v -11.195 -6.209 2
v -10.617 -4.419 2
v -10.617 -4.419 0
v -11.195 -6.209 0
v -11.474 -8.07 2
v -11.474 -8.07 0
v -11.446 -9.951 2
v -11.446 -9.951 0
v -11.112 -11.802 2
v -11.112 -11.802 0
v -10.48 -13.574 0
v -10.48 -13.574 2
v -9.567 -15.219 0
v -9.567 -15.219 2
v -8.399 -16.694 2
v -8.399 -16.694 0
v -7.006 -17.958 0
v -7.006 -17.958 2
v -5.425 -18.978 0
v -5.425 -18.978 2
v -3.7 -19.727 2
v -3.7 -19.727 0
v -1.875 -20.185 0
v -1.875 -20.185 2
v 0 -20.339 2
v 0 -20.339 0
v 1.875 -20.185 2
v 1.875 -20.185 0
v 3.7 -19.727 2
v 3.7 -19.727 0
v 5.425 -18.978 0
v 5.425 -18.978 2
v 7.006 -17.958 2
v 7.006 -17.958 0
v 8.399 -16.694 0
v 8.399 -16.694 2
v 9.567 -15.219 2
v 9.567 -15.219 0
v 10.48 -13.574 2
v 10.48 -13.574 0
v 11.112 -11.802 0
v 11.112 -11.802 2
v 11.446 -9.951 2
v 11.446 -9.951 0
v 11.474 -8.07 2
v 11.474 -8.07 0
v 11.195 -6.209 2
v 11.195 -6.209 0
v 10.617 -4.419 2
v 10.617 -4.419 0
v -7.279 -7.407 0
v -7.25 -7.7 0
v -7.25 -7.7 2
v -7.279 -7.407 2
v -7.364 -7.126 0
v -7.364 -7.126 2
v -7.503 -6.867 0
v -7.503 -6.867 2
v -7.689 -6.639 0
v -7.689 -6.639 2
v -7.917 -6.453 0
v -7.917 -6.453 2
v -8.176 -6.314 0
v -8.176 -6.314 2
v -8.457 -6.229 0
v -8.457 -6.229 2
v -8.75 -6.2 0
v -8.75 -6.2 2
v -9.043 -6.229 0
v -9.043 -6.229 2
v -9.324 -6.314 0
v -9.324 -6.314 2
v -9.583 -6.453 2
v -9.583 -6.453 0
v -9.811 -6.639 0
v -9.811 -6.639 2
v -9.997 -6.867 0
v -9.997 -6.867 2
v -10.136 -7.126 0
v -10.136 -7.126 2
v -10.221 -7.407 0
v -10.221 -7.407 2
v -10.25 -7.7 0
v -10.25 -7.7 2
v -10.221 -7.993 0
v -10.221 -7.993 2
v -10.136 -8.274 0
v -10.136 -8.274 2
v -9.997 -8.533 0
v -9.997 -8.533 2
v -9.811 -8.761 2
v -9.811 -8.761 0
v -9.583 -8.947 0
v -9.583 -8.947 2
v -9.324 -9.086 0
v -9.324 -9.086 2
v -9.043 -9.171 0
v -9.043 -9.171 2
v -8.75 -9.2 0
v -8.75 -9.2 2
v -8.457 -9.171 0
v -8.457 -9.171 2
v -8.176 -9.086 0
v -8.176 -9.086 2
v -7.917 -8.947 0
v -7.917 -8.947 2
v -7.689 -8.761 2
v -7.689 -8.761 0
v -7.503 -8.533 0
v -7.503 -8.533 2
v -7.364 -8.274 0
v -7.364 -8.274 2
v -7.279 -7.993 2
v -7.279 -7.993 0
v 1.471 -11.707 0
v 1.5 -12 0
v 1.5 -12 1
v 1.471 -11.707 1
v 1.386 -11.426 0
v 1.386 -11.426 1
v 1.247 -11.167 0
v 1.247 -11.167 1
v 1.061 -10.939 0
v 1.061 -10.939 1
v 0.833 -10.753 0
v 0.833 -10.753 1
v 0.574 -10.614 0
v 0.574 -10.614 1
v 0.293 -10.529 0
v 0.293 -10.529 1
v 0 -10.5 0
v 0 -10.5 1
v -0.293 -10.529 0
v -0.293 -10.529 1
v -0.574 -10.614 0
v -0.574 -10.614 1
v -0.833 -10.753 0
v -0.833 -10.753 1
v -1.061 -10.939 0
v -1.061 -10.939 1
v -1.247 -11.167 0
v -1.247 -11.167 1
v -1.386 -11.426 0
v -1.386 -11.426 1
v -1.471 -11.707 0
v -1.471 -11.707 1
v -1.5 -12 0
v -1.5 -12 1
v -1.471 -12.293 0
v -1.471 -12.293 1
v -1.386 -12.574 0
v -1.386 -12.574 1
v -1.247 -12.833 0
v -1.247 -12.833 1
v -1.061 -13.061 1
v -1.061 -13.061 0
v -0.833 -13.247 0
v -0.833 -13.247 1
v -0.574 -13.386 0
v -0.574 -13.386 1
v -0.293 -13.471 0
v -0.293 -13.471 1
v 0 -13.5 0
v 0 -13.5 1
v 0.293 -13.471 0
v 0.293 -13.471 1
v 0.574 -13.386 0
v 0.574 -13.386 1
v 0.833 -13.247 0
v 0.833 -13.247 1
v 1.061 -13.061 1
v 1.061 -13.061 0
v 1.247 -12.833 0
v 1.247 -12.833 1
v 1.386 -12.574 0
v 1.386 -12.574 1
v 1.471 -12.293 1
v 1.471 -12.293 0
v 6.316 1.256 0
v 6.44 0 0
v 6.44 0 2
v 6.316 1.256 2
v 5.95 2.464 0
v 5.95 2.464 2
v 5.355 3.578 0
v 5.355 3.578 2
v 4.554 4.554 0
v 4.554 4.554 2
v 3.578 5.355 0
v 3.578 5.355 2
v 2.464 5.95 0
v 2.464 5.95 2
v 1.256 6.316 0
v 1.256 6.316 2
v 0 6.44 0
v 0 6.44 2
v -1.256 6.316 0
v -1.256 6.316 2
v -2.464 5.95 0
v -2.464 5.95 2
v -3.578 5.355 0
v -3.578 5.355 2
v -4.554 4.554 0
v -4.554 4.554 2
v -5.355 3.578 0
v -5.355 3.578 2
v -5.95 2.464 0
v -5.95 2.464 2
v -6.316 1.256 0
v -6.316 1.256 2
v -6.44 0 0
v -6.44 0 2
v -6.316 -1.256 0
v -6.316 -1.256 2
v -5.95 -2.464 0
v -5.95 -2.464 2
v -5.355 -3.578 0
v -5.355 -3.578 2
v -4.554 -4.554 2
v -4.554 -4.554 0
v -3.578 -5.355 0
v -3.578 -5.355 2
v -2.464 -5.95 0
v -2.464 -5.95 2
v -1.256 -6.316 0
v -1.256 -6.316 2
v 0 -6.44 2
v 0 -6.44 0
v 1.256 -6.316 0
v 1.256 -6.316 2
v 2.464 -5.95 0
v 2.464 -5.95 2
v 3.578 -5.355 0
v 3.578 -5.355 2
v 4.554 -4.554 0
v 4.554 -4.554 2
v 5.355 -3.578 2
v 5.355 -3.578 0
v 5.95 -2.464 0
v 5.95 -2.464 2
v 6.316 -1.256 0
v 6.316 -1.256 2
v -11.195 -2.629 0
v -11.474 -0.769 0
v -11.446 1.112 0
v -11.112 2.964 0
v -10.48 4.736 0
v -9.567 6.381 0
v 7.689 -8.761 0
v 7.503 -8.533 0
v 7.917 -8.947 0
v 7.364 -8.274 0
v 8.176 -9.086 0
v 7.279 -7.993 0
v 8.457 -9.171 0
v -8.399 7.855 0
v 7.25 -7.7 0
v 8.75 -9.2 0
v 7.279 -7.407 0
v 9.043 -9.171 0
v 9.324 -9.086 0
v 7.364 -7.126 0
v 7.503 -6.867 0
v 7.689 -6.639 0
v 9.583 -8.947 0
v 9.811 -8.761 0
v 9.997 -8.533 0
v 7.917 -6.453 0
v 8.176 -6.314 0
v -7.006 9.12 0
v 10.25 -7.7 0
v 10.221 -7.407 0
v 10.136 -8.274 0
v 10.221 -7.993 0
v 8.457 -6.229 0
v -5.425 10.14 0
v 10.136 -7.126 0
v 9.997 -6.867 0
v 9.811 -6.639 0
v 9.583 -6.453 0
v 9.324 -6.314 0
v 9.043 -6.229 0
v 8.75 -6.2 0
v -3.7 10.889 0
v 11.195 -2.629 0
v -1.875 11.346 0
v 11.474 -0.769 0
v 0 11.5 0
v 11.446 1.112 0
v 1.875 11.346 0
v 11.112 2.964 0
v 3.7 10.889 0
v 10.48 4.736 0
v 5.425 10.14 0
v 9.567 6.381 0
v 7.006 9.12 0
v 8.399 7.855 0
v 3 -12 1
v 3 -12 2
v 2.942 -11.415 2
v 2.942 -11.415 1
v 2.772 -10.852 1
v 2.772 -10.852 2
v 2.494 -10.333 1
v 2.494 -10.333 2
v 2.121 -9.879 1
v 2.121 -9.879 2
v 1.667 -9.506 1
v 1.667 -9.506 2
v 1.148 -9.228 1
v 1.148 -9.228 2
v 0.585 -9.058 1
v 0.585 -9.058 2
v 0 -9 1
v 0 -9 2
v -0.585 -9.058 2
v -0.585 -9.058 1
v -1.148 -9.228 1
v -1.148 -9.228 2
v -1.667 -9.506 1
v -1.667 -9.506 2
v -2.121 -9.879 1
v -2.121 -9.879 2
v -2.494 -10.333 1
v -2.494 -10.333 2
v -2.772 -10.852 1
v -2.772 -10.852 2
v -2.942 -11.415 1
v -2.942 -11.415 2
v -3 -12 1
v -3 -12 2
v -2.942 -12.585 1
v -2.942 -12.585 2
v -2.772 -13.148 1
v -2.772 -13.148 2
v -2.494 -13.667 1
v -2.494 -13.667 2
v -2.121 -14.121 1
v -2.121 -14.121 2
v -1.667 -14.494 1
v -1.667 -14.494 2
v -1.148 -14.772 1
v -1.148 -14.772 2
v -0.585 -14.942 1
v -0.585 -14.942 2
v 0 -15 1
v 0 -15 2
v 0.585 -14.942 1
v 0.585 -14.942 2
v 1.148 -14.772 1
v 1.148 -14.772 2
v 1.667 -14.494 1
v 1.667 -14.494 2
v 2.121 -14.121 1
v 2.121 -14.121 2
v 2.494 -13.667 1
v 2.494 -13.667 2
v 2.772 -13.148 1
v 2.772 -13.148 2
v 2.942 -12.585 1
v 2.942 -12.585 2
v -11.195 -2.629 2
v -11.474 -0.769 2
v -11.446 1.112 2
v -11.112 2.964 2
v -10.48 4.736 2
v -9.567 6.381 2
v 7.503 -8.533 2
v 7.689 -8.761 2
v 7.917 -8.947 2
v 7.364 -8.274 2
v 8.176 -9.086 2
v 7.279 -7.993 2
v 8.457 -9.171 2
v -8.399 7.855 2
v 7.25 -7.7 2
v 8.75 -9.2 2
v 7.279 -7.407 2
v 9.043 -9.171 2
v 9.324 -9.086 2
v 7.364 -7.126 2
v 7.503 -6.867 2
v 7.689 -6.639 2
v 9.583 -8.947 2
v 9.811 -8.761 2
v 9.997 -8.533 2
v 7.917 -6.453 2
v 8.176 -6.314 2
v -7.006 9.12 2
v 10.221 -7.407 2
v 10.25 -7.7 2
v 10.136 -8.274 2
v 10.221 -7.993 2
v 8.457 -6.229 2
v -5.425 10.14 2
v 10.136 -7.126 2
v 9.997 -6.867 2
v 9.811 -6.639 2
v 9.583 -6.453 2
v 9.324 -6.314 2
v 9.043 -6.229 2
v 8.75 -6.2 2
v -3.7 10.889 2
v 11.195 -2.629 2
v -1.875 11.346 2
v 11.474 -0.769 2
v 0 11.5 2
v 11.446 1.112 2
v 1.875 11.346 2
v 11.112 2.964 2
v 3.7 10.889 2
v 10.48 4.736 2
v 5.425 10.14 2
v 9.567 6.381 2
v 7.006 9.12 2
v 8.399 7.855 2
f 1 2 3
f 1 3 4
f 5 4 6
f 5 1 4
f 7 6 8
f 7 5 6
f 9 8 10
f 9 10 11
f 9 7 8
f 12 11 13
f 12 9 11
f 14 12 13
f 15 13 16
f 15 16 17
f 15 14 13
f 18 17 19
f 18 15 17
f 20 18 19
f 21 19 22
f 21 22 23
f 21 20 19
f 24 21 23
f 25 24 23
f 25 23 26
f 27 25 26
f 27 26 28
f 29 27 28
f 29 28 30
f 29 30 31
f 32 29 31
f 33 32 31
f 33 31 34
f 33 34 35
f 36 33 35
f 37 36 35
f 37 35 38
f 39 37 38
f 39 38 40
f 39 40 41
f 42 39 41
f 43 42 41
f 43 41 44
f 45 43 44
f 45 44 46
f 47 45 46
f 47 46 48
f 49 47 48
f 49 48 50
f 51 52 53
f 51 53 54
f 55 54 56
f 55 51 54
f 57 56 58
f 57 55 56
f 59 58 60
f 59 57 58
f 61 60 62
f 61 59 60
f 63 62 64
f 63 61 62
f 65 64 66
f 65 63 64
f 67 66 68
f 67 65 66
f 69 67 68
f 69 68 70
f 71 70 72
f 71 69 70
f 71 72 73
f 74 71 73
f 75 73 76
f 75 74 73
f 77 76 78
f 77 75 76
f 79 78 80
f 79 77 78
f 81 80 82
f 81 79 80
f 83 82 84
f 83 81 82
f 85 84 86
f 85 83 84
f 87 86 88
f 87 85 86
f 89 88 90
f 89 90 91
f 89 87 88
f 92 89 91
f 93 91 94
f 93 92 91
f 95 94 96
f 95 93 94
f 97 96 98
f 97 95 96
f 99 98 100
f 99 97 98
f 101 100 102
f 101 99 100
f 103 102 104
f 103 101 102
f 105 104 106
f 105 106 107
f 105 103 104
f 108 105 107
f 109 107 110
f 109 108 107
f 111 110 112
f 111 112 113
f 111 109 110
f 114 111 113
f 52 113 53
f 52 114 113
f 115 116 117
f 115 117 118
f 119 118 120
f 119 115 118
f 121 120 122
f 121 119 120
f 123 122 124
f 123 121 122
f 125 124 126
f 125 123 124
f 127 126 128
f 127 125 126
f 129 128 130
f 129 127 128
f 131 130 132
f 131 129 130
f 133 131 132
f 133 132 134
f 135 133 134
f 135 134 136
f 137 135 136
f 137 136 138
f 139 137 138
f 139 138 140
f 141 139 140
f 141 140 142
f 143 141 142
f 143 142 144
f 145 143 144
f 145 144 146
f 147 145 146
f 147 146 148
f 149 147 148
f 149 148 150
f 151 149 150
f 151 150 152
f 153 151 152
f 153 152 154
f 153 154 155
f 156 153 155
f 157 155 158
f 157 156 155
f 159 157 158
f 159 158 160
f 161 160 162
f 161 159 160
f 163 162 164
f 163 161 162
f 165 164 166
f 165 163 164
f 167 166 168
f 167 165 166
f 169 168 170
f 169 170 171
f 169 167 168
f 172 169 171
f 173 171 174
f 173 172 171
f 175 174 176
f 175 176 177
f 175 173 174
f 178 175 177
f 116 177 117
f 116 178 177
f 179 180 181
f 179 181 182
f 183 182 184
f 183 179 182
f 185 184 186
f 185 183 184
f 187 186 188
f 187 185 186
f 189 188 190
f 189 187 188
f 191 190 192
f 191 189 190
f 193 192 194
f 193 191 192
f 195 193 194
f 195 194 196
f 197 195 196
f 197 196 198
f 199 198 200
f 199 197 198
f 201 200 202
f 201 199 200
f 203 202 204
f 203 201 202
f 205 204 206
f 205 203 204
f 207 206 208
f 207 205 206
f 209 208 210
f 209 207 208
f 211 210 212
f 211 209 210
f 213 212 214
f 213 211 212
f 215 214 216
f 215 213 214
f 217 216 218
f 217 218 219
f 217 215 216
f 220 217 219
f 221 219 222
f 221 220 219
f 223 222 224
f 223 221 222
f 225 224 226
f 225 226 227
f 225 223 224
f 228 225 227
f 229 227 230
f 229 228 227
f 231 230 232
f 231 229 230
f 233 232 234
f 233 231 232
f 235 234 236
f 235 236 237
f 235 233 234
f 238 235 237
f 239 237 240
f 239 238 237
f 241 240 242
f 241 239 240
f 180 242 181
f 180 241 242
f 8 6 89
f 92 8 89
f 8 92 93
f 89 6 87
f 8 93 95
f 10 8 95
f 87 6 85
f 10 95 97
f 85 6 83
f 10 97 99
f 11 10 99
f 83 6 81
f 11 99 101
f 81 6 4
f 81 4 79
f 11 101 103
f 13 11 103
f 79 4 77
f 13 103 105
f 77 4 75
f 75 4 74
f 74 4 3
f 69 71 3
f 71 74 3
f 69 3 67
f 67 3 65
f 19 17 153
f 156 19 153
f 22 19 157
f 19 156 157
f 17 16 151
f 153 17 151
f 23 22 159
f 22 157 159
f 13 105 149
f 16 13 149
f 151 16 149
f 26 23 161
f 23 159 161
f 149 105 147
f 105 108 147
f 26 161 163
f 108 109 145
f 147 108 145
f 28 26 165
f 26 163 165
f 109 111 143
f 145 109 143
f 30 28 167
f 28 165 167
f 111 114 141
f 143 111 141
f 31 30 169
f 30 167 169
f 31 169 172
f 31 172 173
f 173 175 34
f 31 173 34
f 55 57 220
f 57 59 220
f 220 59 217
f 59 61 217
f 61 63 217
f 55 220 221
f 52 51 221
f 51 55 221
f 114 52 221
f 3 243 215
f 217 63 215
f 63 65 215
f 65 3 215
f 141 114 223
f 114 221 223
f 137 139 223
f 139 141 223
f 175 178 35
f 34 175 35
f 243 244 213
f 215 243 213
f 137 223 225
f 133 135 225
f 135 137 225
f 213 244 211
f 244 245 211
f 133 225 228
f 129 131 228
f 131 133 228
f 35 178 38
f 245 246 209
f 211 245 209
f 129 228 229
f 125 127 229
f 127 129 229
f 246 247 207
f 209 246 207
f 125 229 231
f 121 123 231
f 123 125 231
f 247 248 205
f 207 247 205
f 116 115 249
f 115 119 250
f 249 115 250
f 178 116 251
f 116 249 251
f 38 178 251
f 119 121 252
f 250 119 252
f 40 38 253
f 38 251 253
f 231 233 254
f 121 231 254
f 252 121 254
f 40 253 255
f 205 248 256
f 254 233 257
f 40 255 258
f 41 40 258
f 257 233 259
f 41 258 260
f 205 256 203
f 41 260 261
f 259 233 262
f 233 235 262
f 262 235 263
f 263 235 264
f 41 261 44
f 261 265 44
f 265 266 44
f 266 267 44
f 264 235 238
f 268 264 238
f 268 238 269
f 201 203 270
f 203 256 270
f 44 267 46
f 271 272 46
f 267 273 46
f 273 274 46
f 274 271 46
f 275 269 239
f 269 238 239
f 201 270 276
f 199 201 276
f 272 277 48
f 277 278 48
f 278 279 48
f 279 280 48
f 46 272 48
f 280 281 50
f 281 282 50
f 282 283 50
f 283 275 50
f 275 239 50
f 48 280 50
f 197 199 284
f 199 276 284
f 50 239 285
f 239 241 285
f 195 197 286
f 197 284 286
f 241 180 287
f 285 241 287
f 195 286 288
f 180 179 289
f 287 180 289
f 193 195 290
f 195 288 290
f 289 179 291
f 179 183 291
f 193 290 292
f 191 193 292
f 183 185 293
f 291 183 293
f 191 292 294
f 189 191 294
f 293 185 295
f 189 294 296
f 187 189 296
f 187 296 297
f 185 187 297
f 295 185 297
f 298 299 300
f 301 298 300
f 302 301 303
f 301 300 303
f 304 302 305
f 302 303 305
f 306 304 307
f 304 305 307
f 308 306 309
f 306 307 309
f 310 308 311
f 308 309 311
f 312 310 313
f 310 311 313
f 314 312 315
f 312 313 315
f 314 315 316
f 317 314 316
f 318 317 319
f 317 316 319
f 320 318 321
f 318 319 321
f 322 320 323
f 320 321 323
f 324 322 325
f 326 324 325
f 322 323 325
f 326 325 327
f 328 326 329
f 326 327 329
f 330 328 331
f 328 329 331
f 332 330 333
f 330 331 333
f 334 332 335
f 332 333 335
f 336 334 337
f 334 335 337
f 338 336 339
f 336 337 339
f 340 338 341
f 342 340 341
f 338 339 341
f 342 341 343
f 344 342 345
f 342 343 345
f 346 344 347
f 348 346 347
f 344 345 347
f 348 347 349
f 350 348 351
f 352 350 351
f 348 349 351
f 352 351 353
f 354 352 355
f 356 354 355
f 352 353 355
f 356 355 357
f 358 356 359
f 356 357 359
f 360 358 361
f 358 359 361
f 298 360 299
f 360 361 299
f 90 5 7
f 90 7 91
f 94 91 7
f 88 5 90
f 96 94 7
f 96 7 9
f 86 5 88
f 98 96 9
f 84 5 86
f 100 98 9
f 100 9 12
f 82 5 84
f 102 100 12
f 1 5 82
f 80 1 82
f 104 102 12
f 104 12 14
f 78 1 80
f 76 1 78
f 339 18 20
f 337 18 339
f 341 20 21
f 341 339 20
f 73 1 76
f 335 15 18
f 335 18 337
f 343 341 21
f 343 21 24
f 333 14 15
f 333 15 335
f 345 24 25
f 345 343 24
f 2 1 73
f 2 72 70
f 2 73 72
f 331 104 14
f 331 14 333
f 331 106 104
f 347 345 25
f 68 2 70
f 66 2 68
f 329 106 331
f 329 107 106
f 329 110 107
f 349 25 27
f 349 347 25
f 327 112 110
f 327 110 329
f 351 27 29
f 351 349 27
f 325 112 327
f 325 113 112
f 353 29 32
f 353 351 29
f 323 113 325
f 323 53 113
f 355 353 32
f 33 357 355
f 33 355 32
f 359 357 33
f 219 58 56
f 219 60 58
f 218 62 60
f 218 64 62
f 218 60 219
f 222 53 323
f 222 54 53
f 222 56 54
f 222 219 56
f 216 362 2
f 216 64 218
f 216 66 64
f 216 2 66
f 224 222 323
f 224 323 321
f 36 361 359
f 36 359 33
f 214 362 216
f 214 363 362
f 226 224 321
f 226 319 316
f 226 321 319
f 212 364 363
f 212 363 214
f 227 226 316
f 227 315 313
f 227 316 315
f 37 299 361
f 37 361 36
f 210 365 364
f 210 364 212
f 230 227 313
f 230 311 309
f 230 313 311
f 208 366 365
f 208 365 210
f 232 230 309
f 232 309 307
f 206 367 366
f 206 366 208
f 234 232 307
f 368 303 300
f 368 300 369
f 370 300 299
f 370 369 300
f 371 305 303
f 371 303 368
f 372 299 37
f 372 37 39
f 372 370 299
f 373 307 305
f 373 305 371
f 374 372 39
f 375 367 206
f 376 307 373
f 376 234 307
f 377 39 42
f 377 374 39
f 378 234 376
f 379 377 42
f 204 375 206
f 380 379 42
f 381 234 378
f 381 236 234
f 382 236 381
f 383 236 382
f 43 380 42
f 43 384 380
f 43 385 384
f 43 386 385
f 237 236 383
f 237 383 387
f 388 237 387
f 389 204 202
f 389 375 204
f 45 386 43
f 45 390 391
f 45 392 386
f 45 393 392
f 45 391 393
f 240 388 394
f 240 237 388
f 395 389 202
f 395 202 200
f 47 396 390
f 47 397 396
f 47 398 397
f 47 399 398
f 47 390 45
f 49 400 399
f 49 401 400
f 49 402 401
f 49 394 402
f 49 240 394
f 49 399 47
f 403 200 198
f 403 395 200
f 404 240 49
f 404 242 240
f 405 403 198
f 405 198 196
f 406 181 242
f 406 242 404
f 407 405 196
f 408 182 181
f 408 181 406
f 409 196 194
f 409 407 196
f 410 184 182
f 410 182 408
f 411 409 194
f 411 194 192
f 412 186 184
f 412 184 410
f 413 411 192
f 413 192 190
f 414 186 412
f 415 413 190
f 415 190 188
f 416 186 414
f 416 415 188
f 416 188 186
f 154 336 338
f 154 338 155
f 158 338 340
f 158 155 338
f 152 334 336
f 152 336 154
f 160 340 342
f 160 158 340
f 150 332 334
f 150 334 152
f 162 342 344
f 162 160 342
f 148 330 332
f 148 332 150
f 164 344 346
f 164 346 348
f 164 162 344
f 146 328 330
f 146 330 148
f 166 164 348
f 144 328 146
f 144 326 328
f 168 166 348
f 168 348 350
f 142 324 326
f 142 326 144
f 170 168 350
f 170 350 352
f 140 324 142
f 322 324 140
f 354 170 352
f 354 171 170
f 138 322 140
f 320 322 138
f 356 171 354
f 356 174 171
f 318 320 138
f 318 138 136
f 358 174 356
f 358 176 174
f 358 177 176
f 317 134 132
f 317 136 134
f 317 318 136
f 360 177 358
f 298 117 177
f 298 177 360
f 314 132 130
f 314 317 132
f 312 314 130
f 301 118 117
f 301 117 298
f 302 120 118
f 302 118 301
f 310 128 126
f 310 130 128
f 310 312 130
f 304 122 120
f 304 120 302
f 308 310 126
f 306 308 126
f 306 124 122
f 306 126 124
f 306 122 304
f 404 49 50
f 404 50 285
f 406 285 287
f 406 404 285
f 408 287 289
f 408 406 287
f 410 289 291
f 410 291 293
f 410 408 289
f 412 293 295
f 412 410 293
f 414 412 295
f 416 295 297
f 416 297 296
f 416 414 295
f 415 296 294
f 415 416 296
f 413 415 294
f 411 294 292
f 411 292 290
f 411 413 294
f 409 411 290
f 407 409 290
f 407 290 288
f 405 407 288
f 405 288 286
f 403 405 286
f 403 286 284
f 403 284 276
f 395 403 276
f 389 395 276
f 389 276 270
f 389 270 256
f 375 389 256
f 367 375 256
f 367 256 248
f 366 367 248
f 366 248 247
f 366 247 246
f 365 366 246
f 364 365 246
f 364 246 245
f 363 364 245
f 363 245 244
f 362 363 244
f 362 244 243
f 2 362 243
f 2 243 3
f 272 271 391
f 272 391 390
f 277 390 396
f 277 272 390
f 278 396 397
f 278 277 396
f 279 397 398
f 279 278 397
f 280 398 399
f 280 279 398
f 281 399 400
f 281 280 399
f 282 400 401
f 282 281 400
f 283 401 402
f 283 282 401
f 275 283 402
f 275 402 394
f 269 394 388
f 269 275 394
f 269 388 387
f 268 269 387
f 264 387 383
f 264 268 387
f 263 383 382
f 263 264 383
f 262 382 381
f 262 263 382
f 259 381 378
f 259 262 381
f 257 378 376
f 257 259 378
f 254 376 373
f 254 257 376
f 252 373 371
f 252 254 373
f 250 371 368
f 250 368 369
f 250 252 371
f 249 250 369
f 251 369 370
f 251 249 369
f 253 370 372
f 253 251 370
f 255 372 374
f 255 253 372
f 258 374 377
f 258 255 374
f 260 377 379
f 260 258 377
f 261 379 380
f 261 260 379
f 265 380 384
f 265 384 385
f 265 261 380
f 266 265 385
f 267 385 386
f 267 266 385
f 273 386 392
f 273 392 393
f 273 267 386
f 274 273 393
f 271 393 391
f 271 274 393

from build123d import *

# Parameters (mm, degrees)
SKETCH_1_W          = 24
SKETCH_1_H          = 33.932299882
SKETCH_1_R          = 1.5
SKETCH_1_R_2        = 6.44
SKETCH_1_R_3        = 3
EXTRUDE_1_DEPTH     = 2
CUT_EXTRUDE_START   = 2
SKETCH_1_3_R        = 3
SKETCH_1_3_R_2      = 1.5
CUT_EXTRUDE_1_DEPTH = 1
SKETCH_2_W          = 24
SKETCH_2_H          = 33.932299882
CUT_EXTRUDE_3_DEPTH = 3


with BuildPart() as part:
    # 草图1 → 凸台-拉伸1 (new body)
    with BuildSketch(Plane.XY):
        with Locations((0, -4.966149941)):
            Rectangle(SKETCH_1_W, SKETCH_1_H)
        with Locations((-8.75, -7.7)):
            Circle(SKETCH_1_R, mode=Mode.SUBTRACT)
        Circle(SKETCH_1_R_2, mode=Mode.SUBTRACT)
        with Locations((0, -12)):
            Circle(SKETCH_1_R_3, mode=Mode.SUBTRACT)
        with Locations((8.75, -7.7)):
            Circle(SKETCH_1_R, mode=Mode.SUBTRACT)
        with Locations((0, -12)):
            Circle(SKETCH_1_R_3)
        with Locations((0, -12)):
            Circle(SKETCH_1_R, mode=Mode.SUBTRACT)
    extrude(amount=EXTRUDE_1_DEPTH)

    # 草图1<3> → 切除-拉伸1 (cut)
    with BuildSketch(Plane.XY.offset(CUT_EXTRUDE_START)):
        with Locations((0, -12)):
            Circle(SKETCH_1_3_R)
        with Locations((0, -12)):
            Circle(SKETCH_1_3_R_2, mode=Mode.SUBTRACT)
    extrude(amount=-CUT_EXTRUDE_1_DEPTH, mode=Mode.SUBTRACT)

    # 草图2 → 切除-拉伸3 (cut, through all)
    with BuildSketch(Plane.XY.offset(2)):
        with Locations((0, -4.966149941)):
            Rectangle(SKETCH_2_W, SKETCH_2_H)
        with BuildLine():
            ThreePointArc((-10.616967552, -4.419275959), (0, -20.338551918), (10.616967552, -4.419275959))
            ThreePointArc((10.616967552, -4.419275959), (0, 11.5), (-10.616967552, -4.419275959))
        make_face(mode=Mode.SUBTRACT)
    extrude(amount=-CUT_EXTRUDE_3_DEPTH, mode=Mode.SUBTRACT)


solid = part.part
